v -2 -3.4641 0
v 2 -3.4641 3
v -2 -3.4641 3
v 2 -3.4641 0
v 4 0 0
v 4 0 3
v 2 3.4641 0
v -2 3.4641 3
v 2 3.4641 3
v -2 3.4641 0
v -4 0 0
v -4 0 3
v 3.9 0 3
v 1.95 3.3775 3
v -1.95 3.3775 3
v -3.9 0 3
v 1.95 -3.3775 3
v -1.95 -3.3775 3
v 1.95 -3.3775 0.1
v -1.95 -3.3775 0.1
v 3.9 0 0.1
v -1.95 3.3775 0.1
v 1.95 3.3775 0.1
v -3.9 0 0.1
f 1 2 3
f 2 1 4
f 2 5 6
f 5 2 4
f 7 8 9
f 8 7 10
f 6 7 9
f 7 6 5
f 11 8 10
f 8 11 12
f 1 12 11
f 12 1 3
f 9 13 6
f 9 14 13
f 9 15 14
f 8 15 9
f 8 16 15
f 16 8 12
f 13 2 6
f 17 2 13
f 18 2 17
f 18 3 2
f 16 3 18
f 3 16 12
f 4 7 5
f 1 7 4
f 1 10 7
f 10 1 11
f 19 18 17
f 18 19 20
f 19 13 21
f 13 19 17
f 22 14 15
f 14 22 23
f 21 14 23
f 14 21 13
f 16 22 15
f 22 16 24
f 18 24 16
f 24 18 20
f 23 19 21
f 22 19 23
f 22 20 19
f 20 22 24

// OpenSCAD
difference(){
cylinder(r=4, h=3, $fn=6);
translate([0,0,0.1]){
cylinder(r=3.9, h=3, $fn=6);
}
}
